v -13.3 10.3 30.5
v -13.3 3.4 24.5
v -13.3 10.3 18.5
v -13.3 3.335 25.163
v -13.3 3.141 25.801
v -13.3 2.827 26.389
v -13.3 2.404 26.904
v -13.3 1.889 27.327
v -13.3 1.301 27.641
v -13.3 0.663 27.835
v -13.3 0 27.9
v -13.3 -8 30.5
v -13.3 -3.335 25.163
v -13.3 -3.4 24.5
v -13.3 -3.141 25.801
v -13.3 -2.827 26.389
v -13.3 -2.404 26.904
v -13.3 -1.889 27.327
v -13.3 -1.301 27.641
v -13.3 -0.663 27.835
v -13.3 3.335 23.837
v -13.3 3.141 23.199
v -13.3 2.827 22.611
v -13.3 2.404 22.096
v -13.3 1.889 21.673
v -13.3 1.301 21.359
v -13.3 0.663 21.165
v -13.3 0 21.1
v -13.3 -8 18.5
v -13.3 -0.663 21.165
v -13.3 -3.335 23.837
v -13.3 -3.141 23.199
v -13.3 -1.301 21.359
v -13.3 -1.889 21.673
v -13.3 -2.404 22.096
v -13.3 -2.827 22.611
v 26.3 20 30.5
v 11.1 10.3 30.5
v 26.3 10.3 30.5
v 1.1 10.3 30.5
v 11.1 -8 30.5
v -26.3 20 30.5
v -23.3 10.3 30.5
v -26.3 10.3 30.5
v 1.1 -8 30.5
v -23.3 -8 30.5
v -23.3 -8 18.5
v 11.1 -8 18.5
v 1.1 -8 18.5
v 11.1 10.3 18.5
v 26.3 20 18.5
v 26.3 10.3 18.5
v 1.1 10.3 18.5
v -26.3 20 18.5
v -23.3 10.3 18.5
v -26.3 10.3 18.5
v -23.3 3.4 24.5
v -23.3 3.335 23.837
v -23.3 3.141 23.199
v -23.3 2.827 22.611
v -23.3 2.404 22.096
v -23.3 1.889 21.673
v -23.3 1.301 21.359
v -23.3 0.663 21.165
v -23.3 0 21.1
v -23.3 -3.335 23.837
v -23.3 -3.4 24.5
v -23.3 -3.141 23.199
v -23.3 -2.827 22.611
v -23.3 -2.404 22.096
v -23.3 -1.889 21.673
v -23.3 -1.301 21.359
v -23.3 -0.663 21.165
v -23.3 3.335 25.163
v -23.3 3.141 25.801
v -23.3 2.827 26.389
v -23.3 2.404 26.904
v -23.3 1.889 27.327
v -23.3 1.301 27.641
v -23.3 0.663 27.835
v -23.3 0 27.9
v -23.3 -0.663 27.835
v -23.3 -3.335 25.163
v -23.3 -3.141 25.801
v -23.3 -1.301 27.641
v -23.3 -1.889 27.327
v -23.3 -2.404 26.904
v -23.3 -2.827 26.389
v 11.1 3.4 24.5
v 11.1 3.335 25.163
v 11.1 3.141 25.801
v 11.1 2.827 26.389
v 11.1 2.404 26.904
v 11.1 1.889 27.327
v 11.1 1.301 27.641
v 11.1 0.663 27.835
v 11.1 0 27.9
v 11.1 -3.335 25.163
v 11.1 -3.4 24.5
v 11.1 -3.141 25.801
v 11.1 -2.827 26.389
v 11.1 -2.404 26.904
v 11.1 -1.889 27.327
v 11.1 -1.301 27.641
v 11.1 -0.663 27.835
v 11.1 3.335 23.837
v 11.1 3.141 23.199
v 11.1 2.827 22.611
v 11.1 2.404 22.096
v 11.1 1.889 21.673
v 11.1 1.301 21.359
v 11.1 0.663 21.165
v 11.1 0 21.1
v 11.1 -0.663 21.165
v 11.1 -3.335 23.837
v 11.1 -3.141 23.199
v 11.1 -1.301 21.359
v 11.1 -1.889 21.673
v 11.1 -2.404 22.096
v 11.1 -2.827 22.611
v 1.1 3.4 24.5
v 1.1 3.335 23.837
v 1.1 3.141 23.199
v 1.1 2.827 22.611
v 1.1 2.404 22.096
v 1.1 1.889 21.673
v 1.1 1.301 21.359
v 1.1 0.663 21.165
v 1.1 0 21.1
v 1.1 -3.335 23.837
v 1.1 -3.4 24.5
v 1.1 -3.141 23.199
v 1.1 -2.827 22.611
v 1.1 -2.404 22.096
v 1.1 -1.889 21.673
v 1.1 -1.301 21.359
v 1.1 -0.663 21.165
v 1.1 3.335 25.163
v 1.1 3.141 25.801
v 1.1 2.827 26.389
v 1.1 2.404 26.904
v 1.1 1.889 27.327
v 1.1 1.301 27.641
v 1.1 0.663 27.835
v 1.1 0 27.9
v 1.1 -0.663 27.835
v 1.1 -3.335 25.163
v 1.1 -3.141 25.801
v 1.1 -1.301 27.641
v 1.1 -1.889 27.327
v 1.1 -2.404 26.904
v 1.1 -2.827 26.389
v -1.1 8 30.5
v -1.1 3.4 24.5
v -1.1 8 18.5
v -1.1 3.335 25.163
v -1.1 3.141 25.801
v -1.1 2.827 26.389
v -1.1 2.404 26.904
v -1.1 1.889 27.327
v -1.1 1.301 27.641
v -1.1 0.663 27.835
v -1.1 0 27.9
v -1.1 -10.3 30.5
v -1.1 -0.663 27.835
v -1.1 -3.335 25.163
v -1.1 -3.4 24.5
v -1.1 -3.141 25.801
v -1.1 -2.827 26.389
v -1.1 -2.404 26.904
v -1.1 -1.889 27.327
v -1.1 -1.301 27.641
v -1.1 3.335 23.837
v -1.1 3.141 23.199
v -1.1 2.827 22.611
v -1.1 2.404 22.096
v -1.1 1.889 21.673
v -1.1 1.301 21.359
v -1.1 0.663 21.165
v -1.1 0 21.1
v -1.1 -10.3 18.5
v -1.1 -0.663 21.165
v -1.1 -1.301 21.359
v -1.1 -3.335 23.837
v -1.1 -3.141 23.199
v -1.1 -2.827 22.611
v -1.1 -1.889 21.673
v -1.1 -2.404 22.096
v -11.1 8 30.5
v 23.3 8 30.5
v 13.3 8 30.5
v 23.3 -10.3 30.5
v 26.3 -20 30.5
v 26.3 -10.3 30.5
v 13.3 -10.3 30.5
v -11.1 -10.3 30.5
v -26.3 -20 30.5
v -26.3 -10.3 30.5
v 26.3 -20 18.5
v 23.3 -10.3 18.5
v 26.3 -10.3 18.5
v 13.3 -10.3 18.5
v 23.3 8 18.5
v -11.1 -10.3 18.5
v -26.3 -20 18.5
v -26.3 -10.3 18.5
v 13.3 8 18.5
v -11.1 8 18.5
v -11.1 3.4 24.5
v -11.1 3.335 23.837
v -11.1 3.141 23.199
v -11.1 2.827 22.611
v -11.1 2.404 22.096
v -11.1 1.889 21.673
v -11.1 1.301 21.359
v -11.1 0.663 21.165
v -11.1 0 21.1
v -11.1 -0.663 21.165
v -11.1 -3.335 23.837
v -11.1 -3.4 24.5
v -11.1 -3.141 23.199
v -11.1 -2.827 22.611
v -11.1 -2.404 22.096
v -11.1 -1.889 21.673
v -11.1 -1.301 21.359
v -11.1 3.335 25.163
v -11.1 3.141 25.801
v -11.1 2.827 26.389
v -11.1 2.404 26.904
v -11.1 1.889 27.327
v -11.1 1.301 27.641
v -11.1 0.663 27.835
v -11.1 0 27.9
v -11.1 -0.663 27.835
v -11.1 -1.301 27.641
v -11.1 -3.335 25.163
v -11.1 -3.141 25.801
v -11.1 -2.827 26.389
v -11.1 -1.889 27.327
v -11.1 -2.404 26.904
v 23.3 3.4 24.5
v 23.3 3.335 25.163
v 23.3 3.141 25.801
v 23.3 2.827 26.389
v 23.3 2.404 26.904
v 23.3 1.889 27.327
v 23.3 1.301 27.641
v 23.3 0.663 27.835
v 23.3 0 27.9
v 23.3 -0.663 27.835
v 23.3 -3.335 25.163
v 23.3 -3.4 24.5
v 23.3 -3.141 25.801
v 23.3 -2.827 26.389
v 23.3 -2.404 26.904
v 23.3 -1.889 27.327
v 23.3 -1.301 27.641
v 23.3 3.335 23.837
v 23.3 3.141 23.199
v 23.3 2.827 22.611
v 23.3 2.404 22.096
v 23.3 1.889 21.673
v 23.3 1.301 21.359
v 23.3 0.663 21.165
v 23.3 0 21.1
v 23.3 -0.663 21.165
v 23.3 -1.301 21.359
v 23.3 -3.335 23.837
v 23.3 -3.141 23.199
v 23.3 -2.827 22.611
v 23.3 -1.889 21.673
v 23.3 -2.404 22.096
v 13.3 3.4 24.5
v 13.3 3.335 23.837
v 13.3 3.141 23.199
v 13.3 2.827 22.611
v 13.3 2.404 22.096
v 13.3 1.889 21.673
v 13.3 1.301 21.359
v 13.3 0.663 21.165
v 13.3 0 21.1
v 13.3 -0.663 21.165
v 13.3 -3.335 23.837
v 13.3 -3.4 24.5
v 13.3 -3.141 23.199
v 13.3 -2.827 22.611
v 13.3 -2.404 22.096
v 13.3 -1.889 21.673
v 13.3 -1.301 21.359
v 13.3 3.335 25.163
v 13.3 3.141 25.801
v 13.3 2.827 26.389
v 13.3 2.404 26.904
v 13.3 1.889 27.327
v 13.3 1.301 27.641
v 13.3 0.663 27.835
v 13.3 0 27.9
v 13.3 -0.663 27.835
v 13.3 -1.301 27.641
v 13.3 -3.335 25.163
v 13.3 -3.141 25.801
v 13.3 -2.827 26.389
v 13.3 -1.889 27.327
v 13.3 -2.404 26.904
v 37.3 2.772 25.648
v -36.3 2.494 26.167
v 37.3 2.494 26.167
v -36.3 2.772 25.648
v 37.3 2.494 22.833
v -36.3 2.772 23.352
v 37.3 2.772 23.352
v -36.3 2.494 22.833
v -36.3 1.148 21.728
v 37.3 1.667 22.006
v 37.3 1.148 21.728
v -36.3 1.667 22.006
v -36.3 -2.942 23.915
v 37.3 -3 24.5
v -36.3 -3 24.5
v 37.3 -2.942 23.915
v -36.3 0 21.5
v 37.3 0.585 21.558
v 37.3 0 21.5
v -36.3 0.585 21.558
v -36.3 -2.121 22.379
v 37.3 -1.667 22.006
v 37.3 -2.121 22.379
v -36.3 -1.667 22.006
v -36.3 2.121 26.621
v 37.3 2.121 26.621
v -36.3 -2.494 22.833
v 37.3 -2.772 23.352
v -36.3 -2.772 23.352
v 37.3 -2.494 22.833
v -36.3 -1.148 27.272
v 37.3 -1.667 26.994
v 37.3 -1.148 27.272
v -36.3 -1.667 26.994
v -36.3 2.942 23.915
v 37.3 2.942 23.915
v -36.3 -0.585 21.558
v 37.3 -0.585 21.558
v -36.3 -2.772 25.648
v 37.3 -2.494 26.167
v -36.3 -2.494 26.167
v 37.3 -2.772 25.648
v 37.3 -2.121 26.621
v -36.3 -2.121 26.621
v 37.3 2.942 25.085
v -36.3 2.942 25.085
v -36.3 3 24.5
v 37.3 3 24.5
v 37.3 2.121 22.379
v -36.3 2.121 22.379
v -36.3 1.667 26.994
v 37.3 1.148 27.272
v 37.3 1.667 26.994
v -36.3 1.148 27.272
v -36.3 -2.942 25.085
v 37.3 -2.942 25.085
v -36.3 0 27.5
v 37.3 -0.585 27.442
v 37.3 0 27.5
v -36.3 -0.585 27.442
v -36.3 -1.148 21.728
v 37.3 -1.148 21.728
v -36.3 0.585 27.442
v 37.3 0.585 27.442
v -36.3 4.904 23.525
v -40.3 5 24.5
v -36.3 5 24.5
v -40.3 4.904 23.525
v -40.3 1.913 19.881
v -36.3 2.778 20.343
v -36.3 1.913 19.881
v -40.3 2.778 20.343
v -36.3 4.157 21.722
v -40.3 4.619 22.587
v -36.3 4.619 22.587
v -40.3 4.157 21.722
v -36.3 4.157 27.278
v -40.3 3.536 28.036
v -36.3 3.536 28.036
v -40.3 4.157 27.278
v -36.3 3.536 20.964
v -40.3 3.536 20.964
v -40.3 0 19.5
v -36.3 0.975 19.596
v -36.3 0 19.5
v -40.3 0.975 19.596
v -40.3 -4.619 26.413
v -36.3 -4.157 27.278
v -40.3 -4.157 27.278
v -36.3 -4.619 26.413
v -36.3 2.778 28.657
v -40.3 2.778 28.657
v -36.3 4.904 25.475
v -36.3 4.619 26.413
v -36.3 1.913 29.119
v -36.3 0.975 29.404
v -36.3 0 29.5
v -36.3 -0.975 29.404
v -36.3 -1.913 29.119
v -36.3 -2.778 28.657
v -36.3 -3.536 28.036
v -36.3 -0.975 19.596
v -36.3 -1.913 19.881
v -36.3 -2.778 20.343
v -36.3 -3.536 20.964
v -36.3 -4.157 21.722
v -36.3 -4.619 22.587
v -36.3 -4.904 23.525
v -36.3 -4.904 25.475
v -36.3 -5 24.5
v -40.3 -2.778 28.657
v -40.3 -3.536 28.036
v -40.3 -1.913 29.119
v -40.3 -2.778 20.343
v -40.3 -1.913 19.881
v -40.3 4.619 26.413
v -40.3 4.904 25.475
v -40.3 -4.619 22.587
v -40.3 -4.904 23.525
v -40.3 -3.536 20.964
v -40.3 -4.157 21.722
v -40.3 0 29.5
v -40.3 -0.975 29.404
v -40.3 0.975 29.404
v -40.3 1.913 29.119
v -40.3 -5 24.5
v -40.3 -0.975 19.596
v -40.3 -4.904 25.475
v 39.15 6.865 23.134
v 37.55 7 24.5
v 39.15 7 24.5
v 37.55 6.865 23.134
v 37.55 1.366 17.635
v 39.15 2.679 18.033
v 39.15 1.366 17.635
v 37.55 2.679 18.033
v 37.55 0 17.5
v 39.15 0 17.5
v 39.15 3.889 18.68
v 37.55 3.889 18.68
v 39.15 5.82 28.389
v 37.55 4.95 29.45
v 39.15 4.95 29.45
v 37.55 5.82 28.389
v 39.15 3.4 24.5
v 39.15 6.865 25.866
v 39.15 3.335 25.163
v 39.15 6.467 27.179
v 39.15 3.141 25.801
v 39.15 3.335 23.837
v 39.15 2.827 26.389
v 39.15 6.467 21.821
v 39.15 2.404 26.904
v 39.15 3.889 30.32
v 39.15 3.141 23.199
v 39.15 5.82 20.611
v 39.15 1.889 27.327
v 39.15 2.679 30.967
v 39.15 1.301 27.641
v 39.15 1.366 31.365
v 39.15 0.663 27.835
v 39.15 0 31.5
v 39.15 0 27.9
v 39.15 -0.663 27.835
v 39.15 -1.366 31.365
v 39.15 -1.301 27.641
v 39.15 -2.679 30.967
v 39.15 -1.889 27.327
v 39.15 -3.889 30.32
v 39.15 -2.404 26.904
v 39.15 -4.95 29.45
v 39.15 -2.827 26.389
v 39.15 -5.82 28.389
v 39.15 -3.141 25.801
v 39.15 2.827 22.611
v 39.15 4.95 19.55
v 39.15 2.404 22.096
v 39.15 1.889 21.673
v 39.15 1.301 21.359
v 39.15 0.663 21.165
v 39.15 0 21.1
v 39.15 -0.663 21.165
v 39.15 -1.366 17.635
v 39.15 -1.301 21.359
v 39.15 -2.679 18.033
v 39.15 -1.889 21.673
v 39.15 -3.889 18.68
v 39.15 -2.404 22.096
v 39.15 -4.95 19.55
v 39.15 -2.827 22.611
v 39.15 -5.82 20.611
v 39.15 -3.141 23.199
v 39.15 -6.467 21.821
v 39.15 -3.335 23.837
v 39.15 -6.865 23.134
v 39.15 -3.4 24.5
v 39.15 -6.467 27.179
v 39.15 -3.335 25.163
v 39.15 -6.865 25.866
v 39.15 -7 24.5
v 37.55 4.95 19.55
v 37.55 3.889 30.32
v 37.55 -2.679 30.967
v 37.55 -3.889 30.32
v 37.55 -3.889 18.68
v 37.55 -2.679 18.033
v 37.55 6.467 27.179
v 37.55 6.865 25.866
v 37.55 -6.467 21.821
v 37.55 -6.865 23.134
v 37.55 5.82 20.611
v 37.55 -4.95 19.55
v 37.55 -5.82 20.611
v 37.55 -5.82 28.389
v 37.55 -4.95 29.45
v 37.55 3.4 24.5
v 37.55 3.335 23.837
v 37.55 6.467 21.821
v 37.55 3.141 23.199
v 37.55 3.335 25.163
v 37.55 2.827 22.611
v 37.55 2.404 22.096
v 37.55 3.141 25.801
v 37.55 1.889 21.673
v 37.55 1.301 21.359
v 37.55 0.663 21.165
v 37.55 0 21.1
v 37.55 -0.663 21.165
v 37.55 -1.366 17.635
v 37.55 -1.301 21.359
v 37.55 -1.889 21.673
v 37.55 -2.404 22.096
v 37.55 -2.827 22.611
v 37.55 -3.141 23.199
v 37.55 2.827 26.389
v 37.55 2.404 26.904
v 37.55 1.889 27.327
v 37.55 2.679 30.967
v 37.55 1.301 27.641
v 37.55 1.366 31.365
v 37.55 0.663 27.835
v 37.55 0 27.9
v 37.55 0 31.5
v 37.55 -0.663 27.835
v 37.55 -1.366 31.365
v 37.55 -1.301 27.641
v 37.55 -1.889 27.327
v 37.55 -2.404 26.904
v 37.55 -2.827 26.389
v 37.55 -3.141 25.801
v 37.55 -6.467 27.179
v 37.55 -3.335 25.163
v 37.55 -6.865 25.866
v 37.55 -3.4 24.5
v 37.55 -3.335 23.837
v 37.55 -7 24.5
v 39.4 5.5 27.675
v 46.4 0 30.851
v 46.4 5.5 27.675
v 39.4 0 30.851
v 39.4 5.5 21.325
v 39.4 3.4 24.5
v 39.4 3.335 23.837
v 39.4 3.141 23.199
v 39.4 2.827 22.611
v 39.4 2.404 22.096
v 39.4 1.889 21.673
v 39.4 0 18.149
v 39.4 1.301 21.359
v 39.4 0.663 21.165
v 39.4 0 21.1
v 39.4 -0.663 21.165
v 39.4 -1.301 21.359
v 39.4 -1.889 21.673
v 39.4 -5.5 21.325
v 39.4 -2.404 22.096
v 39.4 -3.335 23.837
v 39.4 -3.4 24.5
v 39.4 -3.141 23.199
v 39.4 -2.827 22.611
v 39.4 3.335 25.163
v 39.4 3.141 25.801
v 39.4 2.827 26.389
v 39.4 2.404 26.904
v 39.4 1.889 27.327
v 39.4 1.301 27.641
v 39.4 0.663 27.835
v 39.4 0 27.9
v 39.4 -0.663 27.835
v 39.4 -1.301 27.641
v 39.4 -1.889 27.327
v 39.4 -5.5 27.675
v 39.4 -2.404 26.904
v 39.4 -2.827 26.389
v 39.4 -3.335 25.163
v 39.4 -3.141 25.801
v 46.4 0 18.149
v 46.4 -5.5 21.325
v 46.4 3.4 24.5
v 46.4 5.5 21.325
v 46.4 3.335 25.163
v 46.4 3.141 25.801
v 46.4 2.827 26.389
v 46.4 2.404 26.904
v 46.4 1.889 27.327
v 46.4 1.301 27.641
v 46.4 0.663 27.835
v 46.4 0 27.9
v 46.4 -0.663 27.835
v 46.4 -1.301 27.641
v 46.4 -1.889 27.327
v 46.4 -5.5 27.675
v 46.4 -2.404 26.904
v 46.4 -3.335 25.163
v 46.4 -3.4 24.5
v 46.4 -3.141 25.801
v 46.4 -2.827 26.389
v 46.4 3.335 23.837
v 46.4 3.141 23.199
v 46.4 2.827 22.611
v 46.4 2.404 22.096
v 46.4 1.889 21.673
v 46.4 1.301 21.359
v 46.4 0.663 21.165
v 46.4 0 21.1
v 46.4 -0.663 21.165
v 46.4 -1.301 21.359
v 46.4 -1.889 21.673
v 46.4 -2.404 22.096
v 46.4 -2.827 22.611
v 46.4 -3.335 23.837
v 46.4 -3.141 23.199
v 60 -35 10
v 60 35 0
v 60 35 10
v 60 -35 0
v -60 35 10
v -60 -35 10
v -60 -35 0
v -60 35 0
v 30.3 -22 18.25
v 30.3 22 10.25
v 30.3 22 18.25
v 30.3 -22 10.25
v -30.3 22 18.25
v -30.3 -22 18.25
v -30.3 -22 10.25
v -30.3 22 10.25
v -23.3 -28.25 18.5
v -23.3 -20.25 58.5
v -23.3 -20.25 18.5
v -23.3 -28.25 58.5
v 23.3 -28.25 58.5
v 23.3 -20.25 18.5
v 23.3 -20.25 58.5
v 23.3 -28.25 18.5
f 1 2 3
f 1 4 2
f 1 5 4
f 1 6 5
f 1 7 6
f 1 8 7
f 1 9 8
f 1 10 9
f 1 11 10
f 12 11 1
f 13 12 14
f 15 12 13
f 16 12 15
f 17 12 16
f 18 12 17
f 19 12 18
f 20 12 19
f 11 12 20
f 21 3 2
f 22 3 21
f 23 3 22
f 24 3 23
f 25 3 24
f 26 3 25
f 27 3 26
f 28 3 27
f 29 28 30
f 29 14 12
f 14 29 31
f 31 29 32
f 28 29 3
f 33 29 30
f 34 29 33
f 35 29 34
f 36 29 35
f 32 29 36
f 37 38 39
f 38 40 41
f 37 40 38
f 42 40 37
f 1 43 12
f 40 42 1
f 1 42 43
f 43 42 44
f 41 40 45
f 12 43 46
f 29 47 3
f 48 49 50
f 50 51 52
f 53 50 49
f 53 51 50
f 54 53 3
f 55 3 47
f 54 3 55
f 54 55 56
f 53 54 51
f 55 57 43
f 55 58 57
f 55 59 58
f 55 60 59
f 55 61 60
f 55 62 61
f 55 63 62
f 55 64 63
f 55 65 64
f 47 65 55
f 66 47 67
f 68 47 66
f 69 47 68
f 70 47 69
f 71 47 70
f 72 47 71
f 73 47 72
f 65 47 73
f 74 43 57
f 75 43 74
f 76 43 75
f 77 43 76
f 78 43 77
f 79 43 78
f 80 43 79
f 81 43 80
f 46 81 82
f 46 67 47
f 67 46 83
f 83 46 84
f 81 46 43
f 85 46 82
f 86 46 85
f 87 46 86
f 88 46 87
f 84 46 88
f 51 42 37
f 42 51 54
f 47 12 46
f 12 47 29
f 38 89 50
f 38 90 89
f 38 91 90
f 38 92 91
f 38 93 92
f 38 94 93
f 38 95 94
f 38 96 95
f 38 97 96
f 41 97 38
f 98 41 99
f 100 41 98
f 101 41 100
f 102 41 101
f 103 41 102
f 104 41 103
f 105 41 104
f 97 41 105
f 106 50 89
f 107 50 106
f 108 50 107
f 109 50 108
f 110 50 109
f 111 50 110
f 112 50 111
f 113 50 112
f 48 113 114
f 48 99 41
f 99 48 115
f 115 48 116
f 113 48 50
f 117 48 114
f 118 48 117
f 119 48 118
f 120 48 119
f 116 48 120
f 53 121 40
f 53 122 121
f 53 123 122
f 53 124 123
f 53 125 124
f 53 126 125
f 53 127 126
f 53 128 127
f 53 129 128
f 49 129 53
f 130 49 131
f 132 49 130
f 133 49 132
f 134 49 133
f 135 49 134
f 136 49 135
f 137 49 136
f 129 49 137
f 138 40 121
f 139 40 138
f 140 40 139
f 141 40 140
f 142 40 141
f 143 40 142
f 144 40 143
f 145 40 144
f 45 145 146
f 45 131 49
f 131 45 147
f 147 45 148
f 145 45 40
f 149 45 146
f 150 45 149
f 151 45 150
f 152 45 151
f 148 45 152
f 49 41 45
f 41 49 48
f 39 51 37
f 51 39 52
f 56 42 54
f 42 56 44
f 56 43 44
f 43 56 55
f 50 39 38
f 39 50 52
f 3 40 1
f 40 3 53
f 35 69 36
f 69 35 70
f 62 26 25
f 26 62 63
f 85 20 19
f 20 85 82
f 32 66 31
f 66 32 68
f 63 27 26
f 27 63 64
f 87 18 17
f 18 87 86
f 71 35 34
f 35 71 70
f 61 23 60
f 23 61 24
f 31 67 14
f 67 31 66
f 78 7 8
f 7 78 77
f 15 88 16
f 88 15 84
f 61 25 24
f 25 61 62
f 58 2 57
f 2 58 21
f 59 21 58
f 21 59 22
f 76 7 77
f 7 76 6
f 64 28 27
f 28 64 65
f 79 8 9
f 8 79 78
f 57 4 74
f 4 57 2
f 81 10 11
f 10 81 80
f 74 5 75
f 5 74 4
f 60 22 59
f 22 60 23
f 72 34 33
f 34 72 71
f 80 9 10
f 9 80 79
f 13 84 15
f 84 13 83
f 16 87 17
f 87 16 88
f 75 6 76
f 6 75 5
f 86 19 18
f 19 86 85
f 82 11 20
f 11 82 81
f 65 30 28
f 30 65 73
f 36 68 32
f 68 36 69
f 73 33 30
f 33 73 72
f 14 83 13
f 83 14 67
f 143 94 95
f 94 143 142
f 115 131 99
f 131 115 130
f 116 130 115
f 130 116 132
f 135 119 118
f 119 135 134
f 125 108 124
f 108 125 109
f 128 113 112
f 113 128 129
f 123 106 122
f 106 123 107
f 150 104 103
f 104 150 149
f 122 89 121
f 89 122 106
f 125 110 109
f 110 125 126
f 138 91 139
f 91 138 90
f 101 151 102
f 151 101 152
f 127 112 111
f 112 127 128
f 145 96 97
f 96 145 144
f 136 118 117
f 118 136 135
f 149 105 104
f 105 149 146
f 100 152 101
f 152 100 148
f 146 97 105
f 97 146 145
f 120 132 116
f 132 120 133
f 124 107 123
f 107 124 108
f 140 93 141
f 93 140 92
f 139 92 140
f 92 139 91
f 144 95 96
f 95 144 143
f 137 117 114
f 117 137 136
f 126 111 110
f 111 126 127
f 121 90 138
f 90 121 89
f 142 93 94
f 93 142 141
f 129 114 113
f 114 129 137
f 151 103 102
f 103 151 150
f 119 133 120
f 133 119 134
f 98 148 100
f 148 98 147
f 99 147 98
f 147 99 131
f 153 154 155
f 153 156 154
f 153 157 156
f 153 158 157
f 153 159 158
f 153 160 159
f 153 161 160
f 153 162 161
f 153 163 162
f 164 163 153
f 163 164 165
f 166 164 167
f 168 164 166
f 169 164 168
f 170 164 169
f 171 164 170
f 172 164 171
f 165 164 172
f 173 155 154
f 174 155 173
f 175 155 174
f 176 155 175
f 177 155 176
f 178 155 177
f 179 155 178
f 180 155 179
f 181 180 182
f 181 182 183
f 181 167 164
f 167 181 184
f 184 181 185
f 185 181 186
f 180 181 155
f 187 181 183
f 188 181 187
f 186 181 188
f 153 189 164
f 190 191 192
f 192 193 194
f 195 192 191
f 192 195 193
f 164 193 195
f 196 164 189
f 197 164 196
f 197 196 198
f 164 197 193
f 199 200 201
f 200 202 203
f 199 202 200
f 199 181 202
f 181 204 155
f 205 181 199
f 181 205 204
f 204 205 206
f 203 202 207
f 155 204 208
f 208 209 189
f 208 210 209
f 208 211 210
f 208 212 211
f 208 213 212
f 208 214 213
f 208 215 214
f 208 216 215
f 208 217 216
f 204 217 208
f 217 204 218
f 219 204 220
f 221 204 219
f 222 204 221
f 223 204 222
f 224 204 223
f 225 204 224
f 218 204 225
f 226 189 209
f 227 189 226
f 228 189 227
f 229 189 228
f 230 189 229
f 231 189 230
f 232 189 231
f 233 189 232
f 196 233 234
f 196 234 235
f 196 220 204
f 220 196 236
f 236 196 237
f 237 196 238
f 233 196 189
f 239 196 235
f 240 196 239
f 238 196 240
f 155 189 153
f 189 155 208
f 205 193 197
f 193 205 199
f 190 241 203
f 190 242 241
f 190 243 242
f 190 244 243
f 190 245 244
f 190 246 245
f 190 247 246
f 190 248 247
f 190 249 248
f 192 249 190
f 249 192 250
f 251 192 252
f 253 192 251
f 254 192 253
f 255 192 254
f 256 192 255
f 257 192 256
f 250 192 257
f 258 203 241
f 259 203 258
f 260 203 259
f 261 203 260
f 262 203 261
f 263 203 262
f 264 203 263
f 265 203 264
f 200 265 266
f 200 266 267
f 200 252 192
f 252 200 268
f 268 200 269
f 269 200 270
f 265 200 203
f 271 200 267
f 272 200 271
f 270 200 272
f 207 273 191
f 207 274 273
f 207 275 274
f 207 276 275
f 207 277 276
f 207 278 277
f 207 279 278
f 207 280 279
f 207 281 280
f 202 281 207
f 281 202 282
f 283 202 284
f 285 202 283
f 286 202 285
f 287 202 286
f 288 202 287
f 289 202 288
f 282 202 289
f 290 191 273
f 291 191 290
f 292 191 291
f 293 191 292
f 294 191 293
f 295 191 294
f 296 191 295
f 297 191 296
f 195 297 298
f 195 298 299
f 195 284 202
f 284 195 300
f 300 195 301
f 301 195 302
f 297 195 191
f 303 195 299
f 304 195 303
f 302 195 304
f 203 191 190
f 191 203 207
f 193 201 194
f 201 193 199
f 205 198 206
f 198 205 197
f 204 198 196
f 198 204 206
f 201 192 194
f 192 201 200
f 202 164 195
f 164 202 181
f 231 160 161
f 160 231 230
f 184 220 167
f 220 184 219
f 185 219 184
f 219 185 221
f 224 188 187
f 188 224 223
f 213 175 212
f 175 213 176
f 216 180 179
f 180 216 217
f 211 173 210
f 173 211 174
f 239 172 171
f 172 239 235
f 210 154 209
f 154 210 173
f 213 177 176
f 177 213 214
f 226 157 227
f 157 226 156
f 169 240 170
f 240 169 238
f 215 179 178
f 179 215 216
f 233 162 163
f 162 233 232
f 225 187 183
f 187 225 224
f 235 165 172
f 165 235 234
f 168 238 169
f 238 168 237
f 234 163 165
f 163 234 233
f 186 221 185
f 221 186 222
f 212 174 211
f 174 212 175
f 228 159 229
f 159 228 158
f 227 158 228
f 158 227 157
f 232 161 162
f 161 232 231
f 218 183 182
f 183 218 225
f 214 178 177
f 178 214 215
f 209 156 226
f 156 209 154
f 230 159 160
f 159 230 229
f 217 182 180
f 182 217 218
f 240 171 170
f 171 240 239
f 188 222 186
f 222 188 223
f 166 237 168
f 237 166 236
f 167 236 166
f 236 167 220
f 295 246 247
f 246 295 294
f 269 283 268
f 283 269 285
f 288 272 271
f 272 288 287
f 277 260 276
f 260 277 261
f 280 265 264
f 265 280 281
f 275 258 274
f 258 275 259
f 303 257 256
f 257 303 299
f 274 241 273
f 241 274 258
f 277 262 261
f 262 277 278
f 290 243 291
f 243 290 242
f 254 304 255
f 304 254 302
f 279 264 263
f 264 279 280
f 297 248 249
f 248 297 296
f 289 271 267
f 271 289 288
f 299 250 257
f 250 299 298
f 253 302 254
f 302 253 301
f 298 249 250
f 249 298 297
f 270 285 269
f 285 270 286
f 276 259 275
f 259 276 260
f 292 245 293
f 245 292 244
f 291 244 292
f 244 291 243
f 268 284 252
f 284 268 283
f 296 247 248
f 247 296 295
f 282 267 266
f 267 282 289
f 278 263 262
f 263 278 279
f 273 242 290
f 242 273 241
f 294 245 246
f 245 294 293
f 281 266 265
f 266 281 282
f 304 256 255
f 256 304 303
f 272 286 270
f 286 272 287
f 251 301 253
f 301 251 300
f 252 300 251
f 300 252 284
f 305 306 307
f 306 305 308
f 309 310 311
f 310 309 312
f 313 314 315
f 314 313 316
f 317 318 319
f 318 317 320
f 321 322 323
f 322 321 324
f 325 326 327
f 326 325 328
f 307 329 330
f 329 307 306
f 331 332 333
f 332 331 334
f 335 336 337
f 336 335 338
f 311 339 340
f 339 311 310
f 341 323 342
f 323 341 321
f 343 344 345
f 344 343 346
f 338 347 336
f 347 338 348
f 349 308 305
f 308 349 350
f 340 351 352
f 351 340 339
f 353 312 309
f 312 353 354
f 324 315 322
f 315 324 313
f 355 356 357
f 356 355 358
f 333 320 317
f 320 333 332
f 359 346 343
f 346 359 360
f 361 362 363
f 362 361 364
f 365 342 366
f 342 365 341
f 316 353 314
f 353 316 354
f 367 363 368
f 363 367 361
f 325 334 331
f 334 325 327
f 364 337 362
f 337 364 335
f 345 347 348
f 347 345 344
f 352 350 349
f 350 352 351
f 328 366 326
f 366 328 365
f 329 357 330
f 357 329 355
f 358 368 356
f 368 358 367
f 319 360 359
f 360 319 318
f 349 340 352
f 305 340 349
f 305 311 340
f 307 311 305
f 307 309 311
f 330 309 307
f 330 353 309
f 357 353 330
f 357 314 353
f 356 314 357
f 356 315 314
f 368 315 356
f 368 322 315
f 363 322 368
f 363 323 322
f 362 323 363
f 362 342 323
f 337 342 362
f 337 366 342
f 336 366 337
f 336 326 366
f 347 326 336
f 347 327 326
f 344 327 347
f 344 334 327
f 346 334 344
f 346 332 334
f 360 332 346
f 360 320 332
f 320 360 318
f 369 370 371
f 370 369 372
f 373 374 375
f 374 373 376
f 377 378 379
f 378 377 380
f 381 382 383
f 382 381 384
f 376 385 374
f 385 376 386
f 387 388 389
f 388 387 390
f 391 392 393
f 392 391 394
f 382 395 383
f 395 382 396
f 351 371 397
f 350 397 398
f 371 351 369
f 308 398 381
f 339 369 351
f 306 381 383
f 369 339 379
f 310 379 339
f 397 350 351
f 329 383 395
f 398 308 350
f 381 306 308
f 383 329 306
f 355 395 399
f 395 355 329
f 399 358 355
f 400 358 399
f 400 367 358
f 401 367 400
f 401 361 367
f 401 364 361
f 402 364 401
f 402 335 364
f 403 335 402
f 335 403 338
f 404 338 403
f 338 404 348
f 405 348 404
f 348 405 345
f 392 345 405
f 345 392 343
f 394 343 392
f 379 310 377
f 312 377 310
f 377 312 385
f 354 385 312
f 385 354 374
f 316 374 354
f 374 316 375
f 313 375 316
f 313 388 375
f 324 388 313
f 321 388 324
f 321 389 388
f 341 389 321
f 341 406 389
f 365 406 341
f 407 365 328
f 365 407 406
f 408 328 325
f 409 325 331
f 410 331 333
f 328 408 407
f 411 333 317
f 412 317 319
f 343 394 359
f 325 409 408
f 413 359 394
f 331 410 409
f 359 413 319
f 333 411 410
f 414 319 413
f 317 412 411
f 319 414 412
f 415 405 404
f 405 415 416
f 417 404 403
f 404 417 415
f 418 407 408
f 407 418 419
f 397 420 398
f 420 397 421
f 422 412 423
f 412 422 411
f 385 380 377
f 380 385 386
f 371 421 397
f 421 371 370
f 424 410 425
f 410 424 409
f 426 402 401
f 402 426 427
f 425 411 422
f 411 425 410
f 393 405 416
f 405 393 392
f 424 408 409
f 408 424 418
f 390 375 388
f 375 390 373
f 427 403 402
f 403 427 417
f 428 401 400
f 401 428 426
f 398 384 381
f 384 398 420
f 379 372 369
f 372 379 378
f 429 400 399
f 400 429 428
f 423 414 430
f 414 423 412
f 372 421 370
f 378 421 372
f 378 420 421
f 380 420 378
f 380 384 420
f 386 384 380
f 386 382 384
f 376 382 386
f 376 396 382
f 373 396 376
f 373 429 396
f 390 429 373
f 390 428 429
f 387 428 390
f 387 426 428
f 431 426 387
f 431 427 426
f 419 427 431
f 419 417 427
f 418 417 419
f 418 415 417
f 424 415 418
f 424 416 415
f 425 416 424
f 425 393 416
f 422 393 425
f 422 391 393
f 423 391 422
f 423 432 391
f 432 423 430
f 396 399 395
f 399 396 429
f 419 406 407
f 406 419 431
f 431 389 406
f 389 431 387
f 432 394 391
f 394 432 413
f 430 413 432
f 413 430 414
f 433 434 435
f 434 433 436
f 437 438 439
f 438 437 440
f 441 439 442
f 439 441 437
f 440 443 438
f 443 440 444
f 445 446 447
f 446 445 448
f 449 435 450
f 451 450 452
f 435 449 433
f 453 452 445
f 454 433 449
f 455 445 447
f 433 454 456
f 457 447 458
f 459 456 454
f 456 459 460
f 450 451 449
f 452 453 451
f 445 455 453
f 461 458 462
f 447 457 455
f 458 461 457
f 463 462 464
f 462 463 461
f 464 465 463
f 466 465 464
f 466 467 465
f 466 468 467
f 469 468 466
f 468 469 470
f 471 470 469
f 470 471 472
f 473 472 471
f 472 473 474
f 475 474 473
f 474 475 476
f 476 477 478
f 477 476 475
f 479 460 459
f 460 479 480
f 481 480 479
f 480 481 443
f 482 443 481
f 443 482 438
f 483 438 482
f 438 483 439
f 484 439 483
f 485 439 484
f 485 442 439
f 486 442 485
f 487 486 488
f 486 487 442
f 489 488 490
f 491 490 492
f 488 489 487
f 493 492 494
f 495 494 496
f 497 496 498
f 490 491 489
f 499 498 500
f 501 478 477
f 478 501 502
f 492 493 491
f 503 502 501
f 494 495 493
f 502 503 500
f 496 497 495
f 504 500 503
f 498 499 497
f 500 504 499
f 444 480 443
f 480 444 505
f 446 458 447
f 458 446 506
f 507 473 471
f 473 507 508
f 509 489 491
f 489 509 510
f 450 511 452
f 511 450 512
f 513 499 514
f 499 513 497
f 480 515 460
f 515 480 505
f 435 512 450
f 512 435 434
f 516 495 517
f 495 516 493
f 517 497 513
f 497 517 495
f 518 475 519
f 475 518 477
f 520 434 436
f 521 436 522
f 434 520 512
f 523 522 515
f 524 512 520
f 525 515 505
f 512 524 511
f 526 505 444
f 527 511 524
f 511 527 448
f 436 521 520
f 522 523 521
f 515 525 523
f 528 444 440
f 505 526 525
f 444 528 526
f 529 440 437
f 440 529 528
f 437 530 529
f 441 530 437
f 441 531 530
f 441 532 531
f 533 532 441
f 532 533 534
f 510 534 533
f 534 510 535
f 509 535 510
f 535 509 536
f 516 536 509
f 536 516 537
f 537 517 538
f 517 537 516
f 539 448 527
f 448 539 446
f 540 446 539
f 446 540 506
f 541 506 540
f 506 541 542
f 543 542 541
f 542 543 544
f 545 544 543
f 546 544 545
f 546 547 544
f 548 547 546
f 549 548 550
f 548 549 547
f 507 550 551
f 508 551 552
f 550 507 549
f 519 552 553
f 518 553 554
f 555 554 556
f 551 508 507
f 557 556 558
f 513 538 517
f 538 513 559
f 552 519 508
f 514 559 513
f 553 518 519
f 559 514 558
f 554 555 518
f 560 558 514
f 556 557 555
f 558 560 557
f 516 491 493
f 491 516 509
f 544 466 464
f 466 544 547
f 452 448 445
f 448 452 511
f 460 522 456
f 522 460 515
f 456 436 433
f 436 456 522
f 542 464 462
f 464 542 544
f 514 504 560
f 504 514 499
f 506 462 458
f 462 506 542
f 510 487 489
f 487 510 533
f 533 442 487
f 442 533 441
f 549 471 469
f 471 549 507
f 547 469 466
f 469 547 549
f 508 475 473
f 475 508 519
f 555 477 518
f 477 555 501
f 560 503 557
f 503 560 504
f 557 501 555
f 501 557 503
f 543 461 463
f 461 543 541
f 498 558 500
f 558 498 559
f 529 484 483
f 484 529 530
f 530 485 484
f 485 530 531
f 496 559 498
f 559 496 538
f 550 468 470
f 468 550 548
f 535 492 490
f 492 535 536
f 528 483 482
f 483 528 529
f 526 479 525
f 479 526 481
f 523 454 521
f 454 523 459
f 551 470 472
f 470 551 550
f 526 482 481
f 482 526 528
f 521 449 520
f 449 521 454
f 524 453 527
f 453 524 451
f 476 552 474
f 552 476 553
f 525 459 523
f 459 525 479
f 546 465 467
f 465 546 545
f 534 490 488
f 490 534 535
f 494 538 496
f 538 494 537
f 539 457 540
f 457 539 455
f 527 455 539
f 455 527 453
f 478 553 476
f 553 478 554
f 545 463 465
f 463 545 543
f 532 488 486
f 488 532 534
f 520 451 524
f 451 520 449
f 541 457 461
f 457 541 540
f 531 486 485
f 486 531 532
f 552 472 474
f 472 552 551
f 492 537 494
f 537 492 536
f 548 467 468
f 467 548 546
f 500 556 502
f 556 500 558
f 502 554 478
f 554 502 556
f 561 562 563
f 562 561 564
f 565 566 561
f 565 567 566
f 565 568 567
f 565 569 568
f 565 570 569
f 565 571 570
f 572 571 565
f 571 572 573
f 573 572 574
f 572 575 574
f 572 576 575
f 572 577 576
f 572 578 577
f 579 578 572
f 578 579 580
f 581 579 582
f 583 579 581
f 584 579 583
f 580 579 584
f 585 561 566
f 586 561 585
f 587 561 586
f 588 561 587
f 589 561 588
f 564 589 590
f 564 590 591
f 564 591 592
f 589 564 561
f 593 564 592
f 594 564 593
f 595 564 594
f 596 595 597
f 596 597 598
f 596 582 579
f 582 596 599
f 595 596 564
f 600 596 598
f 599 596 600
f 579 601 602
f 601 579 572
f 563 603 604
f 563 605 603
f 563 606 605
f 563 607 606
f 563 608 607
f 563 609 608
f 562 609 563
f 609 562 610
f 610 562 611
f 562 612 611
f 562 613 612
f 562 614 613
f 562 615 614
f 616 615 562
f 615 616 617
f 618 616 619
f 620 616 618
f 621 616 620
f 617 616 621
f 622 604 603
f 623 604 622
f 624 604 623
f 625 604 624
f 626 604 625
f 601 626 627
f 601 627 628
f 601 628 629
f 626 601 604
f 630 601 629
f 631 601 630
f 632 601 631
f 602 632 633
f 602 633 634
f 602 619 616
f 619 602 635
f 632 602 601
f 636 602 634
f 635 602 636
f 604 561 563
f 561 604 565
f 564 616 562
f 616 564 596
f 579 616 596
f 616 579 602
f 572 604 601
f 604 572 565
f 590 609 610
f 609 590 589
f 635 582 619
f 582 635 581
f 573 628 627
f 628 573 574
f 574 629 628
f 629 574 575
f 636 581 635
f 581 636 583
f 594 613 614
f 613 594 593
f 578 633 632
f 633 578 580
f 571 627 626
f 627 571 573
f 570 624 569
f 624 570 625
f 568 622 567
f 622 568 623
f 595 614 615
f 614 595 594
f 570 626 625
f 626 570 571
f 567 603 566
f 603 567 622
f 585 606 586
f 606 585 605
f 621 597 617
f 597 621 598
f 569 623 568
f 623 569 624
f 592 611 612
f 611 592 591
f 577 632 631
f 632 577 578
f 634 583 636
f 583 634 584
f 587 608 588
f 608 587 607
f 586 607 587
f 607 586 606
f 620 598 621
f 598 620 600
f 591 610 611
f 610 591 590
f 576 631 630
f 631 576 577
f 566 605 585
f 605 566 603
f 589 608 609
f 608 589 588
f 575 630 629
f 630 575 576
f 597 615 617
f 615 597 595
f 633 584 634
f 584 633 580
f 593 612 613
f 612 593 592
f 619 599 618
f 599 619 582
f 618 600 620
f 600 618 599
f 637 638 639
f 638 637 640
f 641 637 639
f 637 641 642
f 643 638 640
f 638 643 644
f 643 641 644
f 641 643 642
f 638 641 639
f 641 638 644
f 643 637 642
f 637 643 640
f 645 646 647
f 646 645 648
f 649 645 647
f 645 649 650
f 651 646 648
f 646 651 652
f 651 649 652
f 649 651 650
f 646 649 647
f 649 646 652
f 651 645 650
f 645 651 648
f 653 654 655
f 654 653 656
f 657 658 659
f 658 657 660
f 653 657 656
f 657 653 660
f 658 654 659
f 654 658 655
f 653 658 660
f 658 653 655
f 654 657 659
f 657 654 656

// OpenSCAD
$fn = 32;

// ------------------------------------------------------------------------
// Comb hinge with flap: leaf 52.6 x 20 mm, pin d6, flap 40 mm
// Every part is its own module, assembly() places every instance.
// ------------------------------------------------------------------------

// --- part 1 ---
module hinge_bed() {
  difference() {
    translate([-60, -35, 0]) cube([120, 70, 10]);
  }
}

// --- part 2 ---
module hinge_riser() {
  difference() {
    translate([-30.3, -22, 0]) cube([60.6, 44, 8]);
  }
}

// --- part 3 ---
module hinge_leaf_a() {
  difference() {
    union() {
      translate([-23.3, -8, -6]) cube([10, 28, 12]);
      translate([1.1, -8, -6]) cube([10, 28, 12]);
      translate([-26.3, 10.3, -6]) cube([52.6, 9.7, 12]);
    }
    translate([-18.3, 0, 0]) rotate([0, 90, 0]) cylinder(h = 12, d = 6.8, center = true);
    translate([6.1, 0, 0]) rotate([0, 90, 0]) cylinder(h = 12, d = 6.8, center = true);
  }
}

// --- part 4 ---
module hinge_leaf_b() {
  difference() {
    union() {
      translate([-11.1, -20, -6]) cube([10, 28, 12]);
      translate([13.3, -20, -6]) cube([10, 28, 12]);
      translate([-26.3, -20, -6]) cube([52.6, 9.7, 12]);
    }
    translate([-6.1, 0, 0]) rotate([0, 90, 0]) cylinder(h = 12, d = 6.8, center = true);
    translate([18.3, 0, 0]) rotate([0, 90, 0]) cylinder(h = 12, d = 6.8, center = true);
  }
}

// --- part 5 ---
module hinge_flap() {
  difference() {
    translate([-23.3, -20, 0]) cube([46.6, 40, 8]);
  }
}

// --- part 6 ---
module hinge_pin() {
  rotate([0, 90, 0]) cylinder(h = 74.6, d = 6, center = true);
  translate([-40.3, 0, 0]) rotate([0, 90, 0]) cylinder(h = 4, d = 10);
}

// --- part 7 ---
module pin_washer() {
  difference() {
      translate([0, 0, 0]) cylinder(h = 1.6, d = 14);
      translate([0, 0, -1]) cylinder(h = 3.6, d = 6.8);
    }
}

// --- part 8 ---
module pin_nut() {
  difference() {
    linear_extrude(height = 7) polygon(points = [[6.351, 0], [3.175, 5.5], [-3.175, 5.5], [-6.351, 0], [-3.175, -5.5], [3.175, -5.5]]);
    translate([0, 0, -1]) cylinder(h = 9, d = 6.8);
  }
}

// --- assembly ---
module assembly() {
  color([0.80, 0.24, 0.20]) translate([0, 0, 0]) rotate([0, 0, 0]) hinge_bed();
  color([0.20, 0.45, 0.75]) translate([0, 0, 10.25]) rotate([0, 0, 0]) hinge_riser();
  color([0.25, 0.62, 0.32]) translate([0, 0, 24.5]) rotate([0, 0, 0]) hinge_leaf_a();
  color([0.92, 0.70, 0.18]) translate([0, 0, 24.5]) rotate([0, 0, 0]) hinge_leaf_b();
  color([0.58, 0.35, 0.70]) translate([0, -20.25, 38.5]) rotate([90, 0, 0]) hinge_flap();
  color([0.16, 0.66, 0.66]) translate([0, 0, 24.5]) rotate([0, 0, 0]) hinge_pin();
  color([0.85, 0.48, 0.18]) translate([37.55, 0, 24.5]) rotate([0, 90, 0]) pin_washer();
  color([0.55, 0.60, 0.65]) translate([39.4, 0, 24.5]) rotate([0, 90, 0]) pin_nut();
}

assembly();
